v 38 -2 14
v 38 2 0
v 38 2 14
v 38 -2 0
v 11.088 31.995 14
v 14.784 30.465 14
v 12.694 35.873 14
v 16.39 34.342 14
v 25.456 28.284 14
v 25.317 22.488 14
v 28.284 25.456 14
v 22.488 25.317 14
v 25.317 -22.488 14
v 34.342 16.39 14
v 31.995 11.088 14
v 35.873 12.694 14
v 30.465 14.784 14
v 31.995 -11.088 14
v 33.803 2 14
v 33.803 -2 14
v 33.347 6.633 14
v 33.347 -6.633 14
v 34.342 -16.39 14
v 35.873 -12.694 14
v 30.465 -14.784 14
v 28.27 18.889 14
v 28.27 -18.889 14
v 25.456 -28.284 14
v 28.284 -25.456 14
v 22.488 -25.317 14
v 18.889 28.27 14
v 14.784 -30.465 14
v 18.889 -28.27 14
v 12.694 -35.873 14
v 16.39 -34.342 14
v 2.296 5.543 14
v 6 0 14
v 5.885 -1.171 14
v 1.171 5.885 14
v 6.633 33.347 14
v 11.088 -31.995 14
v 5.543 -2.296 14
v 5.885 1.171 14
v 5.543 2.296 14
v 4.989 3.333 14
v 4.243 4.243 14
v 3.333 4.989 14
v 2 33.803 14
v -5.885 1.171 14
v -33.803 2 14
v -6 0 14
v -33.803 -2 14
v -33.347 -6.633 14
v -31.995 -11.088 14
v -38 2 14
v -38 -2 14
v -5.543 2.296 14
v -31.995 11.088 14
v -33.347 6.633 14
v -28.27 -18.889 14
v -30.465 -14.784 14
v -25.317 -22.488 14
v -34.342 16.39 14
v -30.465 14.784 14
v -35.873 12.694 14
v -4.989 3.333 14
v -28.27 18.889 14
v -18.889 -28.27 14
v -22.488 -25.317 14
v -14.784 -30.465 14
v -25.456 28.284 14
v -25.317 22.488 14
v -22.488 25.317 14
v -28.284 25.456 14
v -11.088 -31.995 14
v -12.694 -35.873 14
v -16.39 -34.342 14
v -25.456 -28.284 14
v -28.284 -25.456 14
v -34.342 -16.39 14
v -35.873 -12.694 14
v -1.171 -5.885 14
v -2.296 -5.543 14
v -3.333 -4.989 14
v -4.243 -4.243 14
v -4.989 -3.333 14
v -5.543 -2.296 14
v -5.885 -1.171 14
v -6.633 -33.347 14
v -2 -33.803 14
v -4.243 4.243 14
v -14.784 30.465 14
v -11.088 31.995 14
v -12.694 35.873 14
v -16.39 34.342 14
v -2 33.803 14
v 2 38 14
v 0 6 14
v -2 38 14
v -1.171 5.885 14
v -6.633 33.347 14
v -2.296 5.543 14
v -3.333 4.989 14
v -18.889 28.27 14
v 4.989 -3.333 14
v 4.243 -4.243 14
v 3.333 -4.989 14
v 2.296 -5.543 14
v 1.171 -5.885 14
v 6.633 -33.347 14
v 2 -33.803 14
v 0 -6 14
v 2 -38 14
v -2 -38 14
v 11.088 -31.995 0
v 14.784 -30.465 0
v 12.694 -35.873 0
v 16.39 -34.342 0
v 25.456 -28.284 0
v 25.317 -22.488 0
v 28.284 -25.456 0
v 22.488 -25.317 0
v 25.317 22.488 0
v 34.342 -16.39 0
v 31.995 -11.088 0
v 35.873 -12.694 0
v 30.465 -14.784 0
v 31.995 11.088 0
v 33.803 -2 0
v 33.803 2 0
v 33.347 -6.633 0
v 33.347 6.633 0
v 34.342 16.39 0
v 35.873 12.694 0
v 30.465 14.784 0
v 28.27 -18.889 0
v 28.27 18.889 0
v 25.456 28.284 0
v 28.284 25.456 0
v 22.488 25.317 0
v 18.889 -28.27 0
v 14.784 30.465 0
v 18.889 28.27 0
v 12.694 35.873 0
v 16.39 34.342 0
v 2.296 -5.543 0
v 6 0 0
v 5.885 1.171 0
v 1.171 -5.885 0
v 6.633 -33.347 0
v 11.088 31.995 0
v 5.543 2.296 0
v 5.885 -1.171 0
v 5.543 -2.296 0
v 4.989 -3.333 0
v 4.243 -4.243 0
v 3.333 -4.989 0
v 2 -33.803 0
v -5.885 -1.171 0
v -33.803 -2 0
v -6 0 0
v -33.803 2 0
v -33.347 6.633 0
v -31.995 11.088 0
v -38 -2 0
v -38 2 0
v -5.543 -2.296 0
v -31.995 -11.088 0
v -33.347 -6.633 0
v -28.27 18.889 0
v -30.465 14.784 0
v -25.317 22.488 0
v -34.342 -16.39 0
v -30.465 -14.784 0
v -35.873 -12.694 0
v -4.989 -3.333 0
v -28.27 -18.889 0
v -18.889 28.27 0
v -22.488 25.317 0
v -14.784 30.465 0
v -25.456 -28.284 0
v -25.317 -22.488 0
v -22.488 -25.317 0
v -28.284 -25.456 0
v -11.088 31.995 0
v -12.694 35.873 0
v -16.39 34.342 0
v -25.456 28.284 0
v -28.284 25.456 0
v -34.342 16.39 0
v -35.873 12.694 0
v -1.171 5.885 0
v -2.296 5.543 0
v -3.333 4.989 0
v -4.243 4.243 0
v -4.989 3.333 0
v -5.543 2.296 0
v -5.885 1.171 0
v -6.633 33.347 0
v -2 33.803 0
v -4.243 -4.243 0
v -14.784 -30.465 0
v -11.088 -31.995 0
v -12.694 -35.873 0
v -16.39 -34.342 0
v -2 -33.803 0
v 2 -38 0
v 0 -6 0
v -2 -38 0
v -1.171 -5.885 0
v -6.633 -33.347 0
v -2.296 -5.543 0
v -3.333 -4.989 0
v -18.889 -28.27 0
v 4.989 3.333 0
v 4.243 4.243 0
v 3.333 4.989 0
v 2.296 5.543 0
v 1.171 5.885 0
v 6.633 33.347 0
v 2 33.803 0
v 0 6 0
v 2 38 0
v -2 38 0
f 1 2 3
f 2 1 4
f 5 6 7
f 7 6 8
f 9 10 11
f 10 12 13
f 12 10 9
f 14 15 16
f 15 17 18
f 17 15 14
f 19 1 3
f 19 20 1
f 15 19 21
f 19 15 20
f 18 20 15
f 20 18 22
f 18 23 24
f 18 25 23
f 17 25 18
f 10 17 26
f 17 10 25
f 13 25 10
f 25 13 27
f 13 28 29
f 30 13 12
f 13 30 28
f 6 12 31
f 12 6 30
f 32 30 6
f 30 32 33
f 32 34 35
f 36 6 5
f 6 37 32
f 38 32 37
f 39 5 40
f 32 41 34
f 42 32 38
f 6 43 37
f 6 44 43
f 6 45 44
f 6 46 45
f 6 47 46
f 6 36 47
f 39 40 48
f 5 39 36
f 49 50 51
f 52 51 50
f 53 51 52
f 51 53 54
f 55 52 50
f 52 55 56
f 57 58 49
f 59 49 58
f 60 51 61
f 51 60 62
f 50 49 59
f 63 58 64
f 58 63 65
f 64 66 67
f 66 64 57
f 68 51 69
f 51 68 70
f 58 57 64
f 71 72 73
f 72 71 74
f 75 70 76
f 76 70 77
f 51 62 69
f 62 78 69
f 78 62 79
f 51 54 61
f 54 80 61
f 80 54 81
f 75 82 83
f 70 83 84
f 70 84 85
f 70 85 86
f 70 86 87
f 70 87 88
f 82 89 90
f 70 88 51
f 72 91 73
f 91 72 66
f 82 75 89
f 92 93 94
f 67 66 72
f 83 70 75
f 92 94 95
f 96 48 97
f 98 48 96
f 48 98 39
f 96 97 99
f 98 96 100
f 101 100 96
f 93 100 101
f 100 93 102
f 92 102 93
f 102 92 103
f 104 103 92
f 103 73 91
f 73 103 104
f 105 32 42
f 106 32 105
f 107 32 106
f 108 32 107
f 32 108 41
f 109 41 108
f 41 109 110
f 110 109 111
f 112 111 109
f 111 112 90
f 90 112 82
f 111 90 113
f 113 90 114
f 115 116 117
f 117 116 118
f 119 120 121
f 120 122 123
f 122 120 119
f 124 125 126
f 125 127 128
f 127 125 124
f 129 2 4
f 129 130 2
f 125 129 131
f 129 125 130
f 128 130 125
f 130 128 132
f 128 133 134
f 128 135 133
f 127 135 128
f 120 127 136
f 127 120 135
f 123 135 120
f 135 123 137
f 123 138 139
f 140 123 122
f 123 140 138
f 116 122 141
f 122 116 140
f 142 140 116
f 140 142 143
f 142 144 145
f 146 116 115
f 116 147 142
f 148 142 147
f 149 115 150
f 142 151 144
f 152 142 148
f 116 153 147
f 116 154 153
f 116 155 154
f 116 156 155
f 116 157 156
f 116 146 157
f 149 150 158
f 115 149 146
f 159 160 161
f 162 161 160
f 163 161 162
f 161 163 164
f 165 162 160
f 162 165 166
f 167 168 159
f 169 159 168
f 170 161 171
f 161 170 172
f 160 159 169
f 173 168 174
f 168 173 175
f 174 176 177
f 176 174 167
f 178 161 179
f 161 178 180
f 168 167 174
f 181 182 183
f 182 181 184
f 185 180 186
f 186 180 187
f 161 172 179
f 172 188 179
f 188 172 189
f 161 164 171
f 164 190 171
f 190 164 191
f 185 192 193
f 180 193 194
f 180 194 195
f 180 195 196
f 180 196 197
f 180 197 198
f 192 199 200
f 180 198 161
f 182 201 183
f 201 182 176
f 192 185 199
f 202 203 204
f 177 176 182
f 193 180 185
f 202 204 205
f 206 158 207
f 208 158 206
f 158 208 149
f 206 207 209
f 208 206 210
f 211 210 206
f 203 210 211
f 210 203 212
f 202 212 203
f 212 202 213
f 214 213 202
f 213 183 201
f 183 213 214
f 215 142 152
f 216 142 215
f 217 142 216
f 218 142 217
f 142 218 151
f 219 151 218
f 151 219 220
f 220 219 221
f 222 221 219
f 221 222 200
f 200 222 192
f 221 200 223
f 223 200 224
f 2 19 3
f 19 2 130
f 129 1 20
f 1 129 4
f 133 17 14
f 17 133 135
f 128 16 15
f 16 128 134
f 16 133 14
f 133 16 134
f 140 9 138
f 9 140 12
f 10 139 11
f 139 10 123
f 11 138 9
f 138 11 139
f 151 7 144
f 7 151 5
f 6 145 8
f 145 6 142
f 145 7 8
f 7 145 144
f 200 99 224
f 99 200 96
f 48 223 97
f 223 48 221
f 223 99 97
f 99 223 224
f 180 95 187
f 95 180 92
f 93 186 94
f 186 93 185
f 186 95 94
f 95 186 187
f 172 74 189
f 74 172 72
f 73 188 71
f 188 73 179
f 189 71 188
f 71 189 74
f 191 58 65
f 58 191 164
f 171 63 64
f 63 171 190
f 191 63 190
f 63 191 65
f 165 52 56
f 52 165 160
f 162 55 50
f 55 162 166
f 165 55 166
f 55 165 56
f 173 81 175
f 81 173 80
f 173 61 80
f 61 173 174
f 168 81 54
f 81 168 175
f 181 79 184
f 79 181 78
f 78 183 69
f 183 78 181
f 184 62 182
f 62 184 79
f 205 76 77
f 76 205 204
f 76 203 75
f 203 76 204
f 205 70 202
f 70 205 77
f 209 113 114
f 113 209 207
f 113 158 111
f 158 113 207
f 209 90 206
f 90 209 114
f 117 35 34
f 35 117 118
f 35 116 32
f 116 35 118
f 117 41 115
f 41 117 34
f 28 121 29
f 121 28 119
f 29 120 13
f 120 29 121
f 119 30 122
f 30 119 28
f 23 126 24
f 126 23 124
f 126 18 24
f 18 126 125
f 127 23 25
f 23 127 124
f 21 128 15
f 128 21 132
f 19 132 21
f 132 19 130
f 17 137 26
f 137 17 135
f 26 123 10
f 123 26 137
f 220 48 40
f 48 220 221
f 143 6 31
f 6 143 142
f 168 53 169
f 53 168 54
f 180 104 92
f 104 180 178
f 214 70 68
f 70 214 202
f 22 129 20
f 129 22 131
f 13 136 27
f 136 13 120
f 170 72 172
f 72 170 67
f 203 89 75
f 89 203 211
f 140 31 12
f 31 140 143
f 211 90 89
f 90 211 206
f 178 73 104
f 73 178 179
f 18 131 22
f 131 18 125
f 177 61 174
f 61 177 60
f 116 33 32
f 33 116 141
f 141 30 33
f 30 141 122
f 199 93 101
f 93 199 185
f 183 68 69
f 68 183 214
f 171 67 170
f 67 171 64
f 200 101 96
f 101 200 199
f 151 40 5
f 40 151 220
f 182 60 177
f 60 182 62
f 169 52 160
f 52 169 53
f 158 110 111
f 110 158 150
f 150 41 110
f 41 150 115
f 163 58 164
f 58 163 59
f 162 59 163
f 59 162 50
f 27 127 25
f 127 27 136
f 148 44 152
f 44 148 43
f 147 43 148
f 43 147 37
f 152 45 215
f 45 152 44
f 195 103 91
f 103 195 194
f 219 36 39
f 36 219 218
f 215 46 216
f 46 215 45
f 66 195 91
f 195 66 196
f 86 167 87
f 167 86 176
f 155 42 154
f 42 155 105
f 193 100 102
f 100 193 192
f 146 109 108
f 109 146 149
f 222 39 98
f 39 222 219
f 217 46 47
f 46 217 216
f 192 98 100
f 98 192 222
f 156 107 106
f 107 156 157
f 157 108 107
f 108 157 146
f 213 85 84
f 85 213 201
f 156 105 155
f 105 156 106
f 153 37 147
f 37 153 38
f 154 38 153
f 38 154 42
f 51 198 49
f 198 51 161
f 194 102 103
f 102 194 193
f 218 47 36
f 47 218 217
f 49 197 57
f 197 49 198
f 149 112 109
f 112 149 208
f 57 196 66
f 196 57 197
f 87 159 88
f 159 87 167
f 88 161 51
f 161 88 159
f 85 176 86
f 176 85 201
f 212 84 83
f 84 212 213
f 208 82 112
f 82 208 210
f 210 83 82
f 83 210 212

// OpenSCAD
$fn = 32;

// ----------------------------------------------------------------------
// Spur blank: bored gear blank
// ----------------------------------------------------------------------

// --- parameters (mm) ---
disc_r = 34;              // blank root radius
disc_t = 14;              // blank thickness
n_teeth = 16;             // stub tooth count
tooth_w = 4;              // tooth width at the root
tooth_h = 4;              // tooth height above the root
bore_r = 6;               // central bore radius

out_r = disc_r + tooth_h;  // tip radius
bbox_x = 76.0;  // measured width over the teeth
bbox_y = 76.0;  // measured depth over the teeth

difference() {
union() {
  cylinder(r = disc_r, h = disc_t);
  for (i = [0 : n_teeth - 1])
    rotate([0, 0, i * 360 / n_teeth])
      translate([disc_r - 1, -tooth_w / 2, 0])
        cube([tooth_h + 1, tooth_w, disc_t]);
}
  translate([0, 0, -1]) cylinder(r = bore_r, h = disc_t + 2);
}
